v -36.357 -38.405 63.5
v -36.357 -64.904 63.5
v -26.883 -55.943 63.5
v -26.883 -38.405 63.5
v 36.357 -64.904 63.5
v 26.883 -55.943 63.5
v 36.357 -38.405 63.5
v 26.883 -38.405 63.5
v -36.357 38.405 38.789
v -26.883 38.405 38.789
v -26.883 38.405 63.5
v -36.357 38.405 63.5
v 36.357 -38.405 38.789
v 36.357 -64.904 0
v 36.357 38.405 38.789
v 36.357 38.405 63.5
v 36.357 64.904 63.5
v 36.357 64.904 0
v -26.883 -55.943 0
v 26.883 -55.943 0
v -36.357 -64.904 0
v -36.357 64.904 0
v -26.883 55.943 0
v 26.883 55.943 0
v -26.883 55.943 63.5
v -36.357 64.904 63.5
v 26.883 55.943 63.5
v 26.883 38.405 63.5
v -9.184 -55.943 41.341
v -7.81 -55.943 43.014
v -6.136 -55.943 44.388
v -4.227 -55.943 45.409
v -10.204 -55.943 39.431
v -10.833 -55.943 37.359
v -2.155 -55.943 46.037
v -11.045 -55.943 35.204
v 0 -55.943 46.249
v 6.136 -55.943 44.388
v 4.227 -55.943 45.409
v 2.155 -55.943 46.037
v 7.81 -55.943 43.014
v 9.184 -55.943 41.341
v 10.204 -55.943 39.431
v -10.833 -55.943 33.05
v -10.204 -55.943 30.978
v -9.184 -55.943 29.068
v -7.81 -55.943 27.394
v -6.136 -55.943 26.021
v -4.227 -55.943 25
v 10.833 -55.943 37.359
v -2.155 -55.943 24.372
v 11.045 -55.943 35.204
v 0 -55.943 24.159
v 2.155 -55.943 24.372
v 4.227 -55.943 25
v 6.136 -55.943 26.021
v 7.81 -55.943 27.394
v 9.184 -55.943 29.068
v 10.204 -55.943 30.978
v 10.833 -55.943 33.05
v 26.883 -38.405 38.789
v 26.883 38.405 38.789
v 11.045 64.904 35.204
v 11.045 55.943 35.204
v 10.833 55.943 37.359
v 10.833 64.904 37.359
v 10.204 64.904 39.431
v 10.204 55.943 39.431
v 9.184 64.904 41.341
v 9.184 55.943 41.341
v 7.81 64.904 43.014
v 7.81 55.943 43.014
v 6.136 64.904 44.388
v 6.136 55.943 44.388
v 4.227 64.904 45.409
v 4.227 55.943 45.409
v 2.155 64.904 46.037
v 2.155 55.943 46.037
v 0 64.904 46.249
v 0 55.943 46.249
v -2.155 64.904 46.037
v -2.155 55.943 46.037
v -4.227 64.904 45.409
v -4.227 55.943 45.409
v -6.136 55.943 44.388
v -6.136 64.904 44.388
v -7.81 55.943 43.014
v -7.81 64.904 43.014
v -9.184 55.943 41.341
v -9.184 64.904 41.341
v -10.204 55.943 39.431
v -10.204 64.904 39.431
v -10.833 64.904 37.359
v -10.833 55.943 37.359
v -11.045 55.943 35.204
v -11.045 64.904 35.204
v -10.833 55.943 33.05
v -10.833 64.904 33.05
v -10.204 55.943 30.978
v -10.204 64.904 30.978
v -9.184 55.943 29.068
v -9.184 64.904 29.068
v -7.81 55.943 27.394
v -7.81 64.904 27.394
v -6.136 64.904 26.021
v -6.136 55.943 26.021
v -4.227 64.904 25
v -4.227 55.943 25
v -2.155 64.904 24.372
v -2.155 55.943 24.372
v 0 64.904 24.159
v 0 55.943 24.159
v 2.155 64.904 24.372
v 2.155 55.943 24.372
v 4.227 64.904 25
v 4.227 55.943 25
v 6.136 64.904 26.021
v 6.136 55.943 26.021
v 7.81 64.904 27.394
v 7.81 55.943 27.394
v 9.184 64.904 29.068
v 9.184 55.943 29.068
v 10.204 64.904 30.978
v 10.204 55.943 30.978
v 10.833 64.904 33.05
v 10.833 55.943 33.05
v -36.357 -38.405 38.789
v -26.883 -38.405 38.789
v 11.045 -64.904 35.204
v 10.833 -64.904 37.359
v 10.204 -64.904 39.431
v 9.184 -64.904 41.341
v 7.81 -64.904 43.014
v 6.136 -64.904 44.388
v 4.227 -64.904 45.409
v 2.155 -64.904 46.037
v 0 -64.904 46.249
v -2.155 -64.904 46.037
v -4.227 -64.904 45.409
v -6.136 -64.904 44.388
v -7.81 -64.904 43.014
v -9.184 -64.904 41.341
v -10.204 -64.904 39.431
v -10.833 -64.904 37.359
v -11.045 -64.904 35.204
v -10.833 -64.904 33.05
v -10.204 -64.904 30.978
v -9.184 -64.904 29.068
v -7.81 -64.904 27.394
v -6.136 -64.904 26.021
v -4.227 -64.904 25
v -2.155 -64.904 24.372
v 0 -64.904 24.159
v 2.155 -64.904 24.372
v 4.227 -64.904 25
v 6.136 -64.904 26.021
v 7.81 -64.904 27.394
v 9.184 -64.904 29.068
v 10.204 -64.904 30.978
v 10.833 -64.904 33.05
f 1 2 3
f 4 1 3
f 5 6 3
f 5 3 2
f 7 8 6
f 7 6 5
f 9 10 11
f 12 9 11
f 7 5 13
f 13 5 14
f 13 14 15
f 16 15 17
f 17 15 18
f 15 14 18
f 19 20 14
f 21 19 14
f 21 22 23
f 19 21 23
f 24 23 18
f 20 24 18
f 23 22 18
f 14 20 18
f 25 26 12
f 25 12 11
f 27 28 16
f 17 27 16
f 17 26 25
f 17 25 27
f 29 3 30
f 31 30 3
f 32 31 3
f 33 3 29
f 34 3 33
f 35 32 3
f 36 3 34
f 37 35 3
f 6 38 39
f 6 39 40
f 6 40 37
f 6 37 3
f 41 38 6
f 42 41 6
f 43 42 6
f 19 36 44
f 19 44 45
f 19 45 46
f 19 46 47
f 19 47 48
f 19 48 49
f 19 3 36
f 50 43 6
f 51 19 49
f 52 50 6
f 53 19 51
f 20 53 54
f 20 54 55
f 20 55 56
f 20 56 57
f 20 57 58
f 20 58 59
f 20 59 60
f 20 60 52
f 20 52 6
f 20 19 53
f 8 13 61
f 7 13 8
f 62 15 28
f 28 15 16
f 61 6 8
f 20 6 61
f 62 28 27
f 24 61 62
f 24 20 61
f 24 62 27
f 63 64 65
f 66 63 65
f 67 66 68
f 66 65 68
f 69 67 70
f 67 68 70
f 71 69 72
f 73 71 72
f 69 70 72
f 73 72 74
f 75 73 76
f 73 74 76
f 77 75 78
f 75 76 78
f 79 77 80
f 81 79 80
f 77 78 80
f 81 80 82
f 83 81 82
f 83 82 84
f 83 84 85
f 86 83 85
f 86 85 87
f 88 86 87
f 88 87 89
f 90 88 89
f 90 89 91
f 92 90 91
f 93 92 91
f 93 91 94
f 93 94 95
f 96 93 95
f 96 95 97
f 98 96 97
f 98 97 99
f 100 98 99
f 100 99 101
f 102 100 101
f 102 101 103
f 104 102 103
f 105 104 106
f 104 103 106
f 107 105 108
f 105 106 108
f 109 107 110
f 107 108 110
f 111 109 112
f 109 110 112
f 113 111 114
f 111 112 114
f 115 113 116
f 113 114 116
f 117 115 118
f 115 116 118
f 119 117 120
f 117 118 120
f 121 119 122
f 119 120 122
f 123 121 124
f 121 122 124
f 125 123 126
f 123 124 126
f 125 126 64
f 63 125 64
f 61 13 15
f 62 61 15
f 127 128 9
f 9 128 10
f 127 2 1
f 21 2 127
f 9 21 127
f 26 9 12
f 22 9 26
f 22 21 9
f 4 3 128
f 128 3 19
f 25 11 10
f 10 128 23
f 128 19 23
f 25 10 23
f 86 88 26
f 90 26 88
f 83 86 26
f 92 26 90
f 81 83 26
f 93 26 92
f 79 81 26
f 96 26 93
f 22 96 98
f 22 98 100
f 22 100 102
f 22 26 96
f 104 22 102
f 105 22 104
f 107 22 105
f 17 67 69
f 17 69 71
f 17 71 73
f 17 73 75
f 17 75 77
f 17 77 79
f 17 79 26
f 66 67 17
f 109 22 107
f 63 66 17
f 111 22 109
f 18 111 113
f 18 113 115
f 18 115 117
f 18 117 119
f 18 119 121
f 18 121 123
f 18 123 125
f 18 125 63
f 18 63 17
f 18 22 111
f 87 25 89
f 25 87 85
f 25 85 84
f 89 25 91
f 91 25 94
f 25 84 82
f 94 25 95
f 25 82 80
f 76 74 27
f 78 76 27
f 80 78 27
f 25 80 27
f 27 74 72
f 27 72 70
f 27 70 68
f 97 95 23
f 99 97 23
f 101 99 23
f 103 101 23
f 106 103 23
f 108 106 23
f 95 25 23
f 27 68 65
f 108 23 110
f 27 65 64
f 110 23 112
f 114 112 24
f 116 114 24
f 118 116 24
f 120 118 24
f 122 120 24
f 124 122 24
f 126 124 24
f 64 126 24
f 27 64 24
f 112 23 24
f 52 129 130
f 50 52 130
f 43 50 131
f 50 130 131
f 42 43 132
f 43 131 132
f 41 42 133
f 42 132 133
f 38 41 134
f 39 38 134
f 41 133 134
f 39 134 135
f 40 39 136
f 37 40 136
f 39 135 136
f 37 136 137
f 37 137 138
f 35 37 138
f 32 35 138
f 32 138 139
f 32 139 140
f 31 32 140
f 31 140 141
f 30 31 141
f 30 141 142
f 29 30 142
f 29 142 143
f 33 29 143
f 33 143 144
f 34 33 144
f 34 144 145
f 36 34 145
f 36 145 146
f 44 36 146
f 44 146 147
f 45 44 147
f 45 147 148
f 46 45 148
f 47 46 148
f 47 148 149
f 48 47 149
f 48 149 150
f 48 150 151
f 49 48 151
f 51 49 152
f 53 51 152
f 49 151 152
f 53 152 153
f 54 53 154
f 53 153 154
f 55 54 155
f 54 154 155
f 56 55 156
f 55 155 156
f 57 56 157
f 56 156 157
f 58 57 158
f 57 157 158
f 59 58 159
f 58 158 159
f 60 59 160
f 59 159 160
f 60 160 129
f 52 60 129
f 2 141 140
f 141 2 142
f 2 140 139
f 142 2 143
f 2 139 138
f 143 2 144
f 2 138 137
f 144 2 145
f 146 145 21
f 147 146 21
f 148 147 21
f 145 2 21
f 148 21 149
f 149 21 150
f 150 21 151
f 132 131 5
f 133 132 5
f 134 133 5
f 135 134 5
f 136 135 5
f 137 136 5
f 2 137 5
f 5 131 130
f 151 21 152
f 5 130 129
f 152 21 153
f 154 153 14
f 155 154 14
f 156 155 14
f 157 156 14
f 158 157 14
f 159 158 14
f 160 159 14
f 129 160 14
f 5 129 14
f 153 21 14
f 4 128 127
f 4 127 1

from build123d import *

# Parameters (mm, degrees)
F0_W     = 72.713092
F0_H     = 129.808232
F1_DEPTH = 63.5
F2_R     = 11.045044
F3_DEPTH = 129.809232
F4_W     = 76.8096
F4_H     = 25.091141
F5_DEPTH = 72.714092
F6_W     = 53.76672
F6_H     = 111.88598
F7_DEPTH = 63.501


with BuildPart() as f1:
    # F0 (on Top) → F1 (new body)
    with BuildSketch(Plane.XY):
        Rectangle(F0_W, F0_H)
    extrude(amount=F1_DEPTH)

    # F2 (on face) → F3 (cut, through all)
    with BuildSketch(Plane.XZ.offset(64.904116)):
        with Locations((0, 35.204399)):
            Circle(F2_R)
    extrude(amount=-F3_DEPTH, mode=Mode.SUBTRACT)

    # F4 (on face) → F5 (cut, through all)
    with BuildSketch(Plane.YZ.offset(36.356546)):
        with Locations((0, 51.334418)):
            Rectangle(F4_W, F4_H)
    extrude(amount=-F5_DEPTH, mode=Mode.SUBTRACT)

    # F6 (on Top) → F7 (cut, through all)
    with BuildSketch(Plane.XY):
        Rectangle(F6_W, F6_H)
    extrude(amount=F7_DEPTH, mode=Mode.SUBTRACT)


solid = f1.part
